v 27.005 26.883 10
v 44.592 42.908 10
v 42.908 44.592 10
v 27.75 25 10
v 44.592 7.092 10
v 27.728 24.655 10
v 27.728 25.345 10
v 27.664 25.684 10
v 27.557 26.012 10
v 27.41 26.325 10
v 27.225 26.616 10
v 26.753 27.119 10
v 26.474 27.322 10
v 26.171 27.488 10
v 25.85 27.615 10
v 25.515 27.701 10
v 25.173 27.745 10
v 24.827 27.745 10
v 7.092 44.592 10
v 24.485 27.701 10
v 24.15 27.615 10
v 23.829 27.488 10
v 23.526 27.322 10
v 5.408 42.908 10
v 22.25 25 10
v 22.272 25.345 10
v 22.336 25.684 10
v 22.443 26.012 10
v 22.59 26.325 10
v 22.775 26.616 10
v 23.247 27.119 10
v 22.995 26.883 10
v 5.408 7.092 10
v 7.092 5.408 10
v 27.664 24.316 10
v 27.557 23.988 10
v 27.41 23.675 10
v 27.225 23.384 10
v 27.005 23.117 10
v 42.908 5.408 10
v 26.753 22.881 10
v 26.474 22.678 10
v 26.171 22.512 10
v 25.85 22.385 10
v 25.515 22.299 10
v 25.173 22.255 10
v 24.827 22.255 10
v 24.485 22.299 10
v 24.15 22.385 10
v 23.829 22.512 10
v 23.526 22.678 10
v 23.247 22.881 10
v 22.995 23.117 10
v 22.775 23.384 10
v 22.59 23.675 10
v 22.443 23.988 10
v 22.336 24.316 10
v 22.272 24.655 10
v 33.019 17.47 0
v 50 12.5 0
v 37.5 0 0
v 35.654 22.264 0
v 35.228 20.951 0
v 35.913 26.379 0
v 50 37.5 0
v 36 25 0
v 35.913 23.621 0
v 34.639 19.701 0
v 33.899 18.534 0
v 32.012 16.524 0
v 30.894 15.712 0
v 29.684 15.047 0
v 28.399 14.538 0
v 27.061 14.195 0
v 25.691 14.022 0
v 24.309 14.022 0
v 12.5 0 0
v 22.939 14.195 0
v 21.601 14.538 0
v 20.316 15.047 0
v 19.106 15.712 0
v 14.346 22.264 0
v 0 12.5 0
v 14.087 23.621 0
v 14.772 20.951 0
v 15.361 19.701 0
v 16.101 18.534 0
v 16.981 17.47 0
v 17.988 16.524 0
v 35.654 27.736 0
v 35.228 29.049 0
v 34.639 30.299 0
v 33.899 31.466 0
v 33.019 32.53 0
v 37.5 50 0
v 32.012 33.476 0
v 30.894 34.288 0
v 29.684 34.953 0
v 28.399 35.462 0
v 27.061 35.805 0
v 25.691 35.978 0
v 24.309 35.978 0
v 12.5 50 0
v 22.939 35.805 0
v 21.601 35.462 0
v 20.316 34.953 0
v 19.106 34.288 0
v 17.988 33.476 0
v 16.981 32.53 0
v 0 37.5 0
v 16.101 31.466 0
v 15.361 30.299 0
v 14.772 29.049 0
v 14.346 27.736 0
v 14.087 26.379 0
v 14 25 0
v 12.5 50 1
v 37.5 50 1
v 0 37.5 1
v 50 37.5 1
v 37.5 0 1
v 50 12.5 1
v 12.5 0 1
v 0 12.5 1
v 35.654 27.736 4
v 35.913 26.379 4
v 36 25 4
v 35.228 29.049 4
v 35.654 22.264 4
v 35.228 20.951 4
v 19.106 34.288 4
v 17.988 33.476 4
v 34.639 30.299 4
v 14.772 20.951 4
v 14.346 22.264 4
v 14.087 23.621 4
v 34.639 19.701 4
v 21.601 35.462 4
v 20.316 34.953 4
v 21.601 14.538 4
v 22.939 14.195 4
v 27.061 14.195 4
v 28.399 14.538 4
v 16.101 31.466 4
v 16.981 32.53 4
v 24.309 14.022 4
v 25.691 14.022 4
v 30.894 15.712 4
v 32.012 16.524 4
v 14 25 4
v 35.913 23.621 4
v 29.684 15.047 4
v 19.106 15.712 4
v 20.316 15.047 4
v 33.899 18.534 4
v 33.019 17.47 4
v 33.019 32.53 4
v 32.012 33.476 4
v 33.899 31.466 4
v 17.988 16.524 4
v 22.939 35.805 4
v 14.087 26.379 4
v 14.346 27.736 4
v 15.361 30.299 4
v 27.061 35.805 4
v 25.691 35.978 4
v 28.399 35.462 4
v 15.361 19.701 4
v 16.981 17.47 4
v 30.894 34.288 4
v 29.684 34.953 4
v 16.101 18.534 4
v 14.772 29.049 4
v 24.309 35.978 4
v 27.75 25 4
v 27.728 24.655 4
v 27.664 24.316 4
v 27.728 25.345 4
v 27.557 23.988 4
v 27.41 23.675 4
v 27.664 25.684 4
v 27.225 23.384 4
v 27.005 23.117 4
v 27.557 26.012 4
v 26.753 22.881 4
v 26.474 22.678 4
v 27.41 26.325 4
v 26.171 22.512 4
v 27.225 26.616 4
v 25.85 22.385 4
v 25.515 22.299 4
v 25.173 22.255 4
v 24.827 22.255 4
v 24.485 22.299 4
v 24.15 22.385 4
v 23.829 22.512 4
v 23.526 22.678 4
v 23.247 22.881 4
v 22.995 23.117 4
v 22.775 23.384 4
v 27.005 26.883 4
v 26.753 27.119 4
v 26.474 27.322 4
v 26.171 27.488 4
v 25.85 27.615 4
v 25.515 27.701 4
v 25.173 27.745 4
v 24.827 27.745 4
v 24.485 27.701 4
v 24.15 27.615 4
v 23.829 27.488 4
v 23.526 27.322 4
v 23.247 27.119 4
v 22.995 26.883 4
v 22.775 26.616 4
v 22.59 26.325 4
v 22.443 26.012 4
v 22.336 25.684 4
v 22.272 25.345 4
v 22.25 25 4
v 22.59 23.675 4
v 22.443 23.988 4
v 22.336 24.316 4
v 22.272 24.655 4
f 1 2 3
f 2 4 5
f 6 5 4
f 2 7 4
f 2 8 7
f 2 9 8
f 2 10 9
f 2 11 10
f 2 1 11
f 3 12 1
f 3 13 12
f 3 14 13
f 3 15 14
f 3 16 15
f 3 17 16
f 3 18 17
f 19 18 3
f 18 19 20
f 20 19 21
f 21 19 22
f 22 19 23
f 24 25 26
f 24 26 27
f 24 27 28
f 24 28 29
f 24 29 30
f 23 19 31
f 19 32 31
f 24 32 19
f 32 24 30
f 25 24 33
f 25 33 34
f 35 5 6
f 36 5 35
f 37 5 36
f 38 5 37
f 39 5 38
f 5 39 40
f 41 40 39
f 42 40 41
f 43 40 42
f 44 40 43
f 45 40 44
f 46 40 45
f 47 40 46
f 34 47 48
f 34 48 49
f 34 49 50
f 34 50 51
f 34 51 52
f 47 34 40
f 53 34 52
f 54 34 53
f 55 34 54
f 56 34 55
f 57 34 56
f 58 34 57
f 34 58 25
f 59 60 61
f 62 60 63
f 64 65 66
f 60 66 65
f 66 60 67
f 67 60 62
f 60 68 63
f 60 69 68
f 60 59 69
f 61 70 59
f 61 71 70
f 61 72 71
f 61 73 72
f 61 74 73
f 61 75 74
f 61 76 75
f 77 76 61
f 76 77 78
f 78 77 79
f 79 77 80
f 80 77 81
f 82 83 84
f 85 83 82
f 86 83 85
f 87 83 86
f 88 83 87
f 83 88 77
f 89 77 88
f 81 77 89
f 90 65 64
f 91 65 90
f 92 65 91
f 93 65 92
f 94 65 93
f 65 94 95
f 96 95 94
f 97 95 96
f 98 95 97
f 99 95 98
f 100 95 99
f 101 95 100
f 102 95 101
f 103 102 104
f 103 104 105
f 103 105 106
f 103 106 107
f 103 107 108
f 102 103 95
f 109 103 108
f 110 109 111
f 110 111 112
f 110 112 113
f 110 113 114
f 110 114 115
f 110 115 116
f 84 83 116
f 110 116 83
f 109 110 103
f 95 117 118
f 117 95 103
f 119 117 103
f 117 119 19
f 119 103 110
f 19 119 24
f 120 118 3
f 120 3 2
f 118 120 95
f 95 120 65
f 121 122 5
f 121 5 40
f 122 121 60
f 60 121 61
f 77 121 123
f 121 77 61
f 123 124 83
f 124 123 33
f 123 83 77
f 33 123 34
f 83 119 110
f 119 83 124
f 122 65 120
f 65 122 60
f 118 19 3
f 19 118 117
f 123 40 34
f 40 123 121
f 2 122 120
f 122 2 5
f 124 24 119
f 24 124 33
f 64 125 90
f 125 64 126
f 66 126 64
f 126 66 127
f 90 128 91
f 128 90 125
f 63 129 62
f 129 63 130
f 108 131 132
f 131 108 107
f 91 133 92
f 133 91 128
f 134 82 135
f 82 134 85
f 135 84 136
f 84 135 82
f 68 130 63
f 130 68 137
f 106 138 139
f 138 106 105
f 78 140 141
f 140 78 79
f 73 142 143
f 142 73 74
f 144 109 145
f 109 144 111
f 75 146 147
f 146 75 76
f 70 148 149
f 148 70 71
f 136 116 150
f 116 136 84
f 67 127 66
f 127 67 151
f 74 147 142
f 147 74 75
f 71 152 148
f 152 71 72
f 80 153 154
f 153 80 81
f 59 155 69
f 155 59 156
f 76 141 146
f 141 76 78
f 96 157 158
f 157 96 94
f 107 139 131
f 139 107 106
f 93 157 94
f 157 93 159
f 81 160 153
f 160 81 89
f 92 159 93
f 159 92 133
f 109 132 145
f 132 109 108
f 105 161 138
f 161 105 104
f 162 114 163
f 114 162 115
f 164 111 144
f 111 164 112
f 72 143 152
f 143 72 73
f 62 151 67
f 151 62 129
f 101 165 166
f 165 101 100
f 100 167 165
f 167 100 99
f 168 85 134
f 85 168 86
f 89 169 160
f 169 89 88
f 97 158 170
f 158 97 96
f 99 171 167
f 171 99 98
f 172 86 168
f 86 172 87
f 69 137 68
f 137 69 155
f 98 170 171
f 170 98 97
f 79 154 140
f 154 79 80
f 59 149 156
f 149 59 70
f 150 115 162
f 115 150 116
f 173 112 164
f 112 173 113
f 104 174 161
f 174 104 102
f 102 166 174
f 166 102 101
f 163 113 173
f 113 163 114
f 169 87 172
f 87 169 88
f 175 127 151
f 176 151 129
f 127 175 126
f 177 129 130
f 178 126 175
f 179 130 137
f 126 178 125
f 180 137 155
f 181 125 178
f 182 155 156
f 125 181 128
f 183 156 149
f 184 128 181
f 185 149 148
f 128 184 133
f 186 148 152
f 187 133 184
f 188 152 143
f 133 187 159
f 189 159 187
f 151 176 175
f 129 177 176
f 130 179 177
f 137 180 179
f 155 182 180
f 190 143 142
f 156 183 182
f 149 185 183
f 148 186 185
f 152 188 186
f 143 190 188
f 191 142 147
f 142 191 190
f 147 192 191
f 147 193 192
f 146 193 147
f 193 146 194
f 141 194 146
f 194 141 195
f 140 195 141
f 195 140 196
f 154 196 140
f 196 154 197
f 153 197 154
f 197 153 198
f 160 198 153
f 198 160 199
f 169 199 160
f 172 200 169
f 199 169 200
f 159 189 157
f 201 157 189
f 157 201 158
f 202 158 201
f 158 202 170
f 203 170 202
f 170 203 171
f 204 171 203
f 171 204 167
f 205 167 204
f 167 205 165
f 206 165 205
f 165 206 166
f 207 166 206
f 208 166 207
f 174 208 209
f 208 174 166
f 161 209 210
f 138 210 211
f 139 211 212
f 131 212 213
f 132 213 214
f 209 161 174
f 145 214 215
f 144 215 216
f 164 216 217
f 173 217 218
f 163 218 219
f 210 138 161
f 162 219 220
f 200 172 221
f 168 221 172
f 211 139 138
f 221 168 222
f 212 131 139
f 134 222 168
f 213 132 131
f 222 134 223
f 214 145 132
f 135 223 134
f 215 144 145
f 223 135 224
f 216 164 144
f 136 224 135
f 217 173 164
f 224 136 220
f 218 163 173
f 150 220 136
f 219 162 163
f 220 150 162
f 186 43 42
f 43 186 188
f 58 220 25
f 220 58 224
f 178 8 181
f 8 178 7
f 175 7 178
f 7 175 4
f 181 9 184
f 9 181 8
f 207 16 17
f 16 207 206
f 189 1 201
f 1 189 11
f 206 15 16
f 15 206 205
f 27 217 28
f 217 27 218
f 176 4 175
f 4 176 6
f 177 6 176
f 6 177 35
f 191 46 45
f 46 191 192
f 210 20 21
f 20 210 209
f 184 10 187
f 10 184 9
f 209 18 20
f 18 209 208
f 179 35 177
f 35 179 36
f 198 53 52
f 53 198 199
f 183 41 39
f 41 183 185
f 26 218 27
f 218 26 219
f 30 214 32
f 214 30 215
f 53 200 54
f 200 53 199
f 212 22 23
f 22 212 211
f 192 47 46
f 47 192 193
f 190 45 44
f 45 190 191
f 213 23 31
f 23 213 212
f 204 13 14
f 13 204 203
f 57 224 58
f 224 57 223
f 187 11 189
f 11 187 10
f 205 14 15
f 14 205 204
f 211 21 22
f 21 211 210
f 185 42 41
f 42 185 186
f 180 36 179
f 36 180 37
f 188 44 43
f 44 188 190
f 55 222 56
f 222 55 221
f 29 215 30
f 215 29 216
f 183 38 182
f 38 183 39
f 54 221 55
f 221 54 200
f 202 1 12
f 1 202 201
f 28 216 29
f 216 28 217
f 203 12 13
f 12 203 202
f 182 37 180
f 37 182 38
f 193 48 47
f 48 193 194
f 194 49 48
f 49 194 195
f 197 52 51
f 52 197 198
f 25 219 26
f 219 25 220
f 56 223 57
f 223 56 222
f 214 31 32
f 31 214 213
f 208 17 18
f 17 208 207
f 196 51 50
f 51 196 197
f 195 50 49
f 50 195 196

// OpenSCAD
/*
 * Tripod Mount Plate
 * @model SLIK 618-330
 *
 * @author Ivan Mihov
 * @email ivan@imihov.com
 * @web imihov.com
 * @date 05/11/2018
 */

// Hole
$fn=50;

// Pin head hole
pin_head_height=4;
pin_head_radius=22/2;

// Countersink Pin head - optional
pin_head_countersink_height=1;
pin_head_countersink_radius=12/2;

pin_hole_radius=5.5/2;

// Camera lock washer - optional
pin_lock_height=0.5;
pin_lock_radius=10/2;

/*
 * The model is a custom octagon, made up of 4 trapezoids + 1 square
 * the variables below are are used to set the dimentions
 * All Trapezoids are the same
 */
trapezoid_top_base = 25;
trapezoid_bottom_base = 50;
trapezoid_angle = 45;
trapezoid_height = 12.5;
cube_size = trapezoid_top_base;

// The model thicknes - height
thicknes = 10;

// The angle for the slanted sided
cutoff_deg=31;

/*
 * Create 4 cubes, rotate them, and subtract them 
 * from the base to get the slanted sides
 */
difference()
{
    // Get the custome octagonal base
    base();
    
    // Left slanted side
    translate([0,trapezoid_bottom_base,1])
        rotate([cutoff_deg,0,0])
            cube([trapezoid_top_base*2,thicknes*2,thicknes*2]);
    // Right slanted side
    translate([0,0,1]) mirror([0,1,0])
        rotate([cutoff_deg,0,0])
            cube([trapezoid_top_base*2,thicknes*2,thicknes*2]);
    // Top slanted side
    translate([trapezoid_bottom_base,0,1])
        rotate([0,-cutoff_deg,0])
            cube([thicknes*2,trapezoid_top_base*2,thicknes*2]);
    // Bottom slanted side
    translate([0,0,1]) mirror([1,0,0])
        rotate([0,-cutoff_deg,0])
            cube([thicknes*2,trapezoid_top_base*2,thicknes*2]);
    
    // Pin head hole
    translate([trapezoid_bottom_base/2,trapezoid_bottom_base/2,0])
        cylinder(h=pin_head_height, r=pin_head_radius);
        
    // Countersink Pin head - optional
    //translate([trapezoid_bottom_base/2,trapezoid_bottom_base/2,pin_height])
    //    cylinder(h=pin_head_countersink_height, r1=pin_head_countersink_radius+2, r2=pin_head_countersink_radius);
    
    // Pin hole
    translate([trapezoid_bottom_base/2,trapezoid_bottom_base/2,0])
        cylinder(h=thicknes, r=pin_hole_radius);
    
    // Camera Lock washer - optional
    //translate([trapezoid_bottom_base/2,trapezoid_bottom_base/2,thicknes-pin_lock_height])
    //    cylinder(h=pin_lock_height, r=pin_lock_radius); 
}

// The base is build from 4 trapezoids and a cube
module base() {

    translate([trapezoid_top_base,trapezoid_top_base,0]) {
        // Cube
        translate([0,0,thicknes/2])
        cube([cube_size, cube_size, thicknes], true);
        
        // Top Part
        translate([0,cube_size/2,thicknes/2]) 
            trapezoid(b=trapezoid_bottom_base, angle=trapezoid_angle, H=trapezoid_height, height=thicknes);
            
        // Bottom part
        translate([0,-cube_size/2,thicknes/2])
            rotate(180)
                trapezoid(b=trapezoid_bottom_base, angle=trapezoid_angle, H=trapezoid_height, height=thicknes);
            
        // Left Part
        translate([-cube_size/2,0,thicknes/2]) 
            rotate(90)
            trapezoid(b=trapezoid_bottom_base, angle=trapezoid_angle, H=trapezoid_height, height=thicknes);
            
        // Right part
        translate([cube_size/2,0,thicknes/2])
            rotate(-90)
                trapezoid(b=trapezoid_bottom_base, angle=trapezoid_angle, H=trapezoid_height, height=thicknes);
    } 
}


/*
trapezoid
	Create a Basic Trapezoid (Based on Isosceles_Triangle)
            d
          /----\
         /  |   \
     a  /   H    \ c
       /    |     \
 angle ------------ angle
            b
	b: Length of side b
	angle: Angle at points angleAB & angleBC
	H: The 2D height at which the triangle should be cut to create the trapezoid
	heights: If vector of size 3 (Standard for triangles) both cd & da will be the same height, if vector have 4 values [ab,bc,cd,da] than each point can have different heights.
*/
module trapezoid(
			b, angle=60, H, height=1, heights=undef,
			center=undef, centerXYZ=[true,false,true])
{
	validAngle = (angle < 90);
	adX = H / tan(angle);

	// Calculate Heights at each point
	heightAB = ((heights==undef) ? height : heights[0])/2;
	heightBC = ((heights==undef) ? height : heights[1])/2;
	heightCD = ((heights==undef) ? height : heights[2])/2;
	heightDA = ((heights==undef) ? height : ((len(heights) > 3)?heights[3]:heights[2]))/2;

	// Centers
	centerX = (center || (center==undef && centerXYZ[0]))?0:b/2;
	centerY = (center || (center==undef && centerXYZ[1]))?0:H/2;
	centerZ = (center || (center==undef && centerXYZ[2]))?0:max(heightAB,heightBC,heightCD,heightDA);

	// Points
	y = H/2;
	bx = b/2;
	dx = (b-(adX*2))/2;

	pointAB1 = [centerX-bx, centerY-y, centerZ-heightAB];
	pointAB2 = [centerX-bx, centerY-y, centerZ+heightAB];
	pointBC1 = [centerX+bx, centerY-y, centerZ-heightBC];
	pointBC2 = [centerX+bx, centerY-y, centerZ+heightBC];
	pointCD1 = [centerX+dx, centerY+y, centerZ-heightCD];
	pointCD2 = [centerX+dx, centerY+y, centerZ+heightCD];
	pointDA1 = [centerX-dx, centerY+y, centerZ-heightDA];
	pointDA2 = [centerX-dx, centerY+y, centerZ+heightDA];

	validH = (adX < b/2);

	if (validAngle && validH)
	{
		polyhedron(
			points=[	pointAB1, pointBC1, pointCD1, pointDA1,
						pointAB2, pointBC2, pointCD2, pointDA2 ],
			triangles=[	
				[0, 1, 2],
				[0, 2, 3],
				[4, 6, 5],
				[4, 7, 6],
				[0, 4, 1],
				[1, 4, 5],
				[1, 5, 2],
				[2, 5, 6],
				[2, 6, 3],
				[3, 6, 7],
				[3, 7, 0],
				[0, 7, 4]	] );
	} else {
		if (!validAngle) echo("Trapezoid invalid, angle must be less than 90");
		else echo("Trapezoid invalid, H is larger than triangle");
	}
}


//-----------------------
